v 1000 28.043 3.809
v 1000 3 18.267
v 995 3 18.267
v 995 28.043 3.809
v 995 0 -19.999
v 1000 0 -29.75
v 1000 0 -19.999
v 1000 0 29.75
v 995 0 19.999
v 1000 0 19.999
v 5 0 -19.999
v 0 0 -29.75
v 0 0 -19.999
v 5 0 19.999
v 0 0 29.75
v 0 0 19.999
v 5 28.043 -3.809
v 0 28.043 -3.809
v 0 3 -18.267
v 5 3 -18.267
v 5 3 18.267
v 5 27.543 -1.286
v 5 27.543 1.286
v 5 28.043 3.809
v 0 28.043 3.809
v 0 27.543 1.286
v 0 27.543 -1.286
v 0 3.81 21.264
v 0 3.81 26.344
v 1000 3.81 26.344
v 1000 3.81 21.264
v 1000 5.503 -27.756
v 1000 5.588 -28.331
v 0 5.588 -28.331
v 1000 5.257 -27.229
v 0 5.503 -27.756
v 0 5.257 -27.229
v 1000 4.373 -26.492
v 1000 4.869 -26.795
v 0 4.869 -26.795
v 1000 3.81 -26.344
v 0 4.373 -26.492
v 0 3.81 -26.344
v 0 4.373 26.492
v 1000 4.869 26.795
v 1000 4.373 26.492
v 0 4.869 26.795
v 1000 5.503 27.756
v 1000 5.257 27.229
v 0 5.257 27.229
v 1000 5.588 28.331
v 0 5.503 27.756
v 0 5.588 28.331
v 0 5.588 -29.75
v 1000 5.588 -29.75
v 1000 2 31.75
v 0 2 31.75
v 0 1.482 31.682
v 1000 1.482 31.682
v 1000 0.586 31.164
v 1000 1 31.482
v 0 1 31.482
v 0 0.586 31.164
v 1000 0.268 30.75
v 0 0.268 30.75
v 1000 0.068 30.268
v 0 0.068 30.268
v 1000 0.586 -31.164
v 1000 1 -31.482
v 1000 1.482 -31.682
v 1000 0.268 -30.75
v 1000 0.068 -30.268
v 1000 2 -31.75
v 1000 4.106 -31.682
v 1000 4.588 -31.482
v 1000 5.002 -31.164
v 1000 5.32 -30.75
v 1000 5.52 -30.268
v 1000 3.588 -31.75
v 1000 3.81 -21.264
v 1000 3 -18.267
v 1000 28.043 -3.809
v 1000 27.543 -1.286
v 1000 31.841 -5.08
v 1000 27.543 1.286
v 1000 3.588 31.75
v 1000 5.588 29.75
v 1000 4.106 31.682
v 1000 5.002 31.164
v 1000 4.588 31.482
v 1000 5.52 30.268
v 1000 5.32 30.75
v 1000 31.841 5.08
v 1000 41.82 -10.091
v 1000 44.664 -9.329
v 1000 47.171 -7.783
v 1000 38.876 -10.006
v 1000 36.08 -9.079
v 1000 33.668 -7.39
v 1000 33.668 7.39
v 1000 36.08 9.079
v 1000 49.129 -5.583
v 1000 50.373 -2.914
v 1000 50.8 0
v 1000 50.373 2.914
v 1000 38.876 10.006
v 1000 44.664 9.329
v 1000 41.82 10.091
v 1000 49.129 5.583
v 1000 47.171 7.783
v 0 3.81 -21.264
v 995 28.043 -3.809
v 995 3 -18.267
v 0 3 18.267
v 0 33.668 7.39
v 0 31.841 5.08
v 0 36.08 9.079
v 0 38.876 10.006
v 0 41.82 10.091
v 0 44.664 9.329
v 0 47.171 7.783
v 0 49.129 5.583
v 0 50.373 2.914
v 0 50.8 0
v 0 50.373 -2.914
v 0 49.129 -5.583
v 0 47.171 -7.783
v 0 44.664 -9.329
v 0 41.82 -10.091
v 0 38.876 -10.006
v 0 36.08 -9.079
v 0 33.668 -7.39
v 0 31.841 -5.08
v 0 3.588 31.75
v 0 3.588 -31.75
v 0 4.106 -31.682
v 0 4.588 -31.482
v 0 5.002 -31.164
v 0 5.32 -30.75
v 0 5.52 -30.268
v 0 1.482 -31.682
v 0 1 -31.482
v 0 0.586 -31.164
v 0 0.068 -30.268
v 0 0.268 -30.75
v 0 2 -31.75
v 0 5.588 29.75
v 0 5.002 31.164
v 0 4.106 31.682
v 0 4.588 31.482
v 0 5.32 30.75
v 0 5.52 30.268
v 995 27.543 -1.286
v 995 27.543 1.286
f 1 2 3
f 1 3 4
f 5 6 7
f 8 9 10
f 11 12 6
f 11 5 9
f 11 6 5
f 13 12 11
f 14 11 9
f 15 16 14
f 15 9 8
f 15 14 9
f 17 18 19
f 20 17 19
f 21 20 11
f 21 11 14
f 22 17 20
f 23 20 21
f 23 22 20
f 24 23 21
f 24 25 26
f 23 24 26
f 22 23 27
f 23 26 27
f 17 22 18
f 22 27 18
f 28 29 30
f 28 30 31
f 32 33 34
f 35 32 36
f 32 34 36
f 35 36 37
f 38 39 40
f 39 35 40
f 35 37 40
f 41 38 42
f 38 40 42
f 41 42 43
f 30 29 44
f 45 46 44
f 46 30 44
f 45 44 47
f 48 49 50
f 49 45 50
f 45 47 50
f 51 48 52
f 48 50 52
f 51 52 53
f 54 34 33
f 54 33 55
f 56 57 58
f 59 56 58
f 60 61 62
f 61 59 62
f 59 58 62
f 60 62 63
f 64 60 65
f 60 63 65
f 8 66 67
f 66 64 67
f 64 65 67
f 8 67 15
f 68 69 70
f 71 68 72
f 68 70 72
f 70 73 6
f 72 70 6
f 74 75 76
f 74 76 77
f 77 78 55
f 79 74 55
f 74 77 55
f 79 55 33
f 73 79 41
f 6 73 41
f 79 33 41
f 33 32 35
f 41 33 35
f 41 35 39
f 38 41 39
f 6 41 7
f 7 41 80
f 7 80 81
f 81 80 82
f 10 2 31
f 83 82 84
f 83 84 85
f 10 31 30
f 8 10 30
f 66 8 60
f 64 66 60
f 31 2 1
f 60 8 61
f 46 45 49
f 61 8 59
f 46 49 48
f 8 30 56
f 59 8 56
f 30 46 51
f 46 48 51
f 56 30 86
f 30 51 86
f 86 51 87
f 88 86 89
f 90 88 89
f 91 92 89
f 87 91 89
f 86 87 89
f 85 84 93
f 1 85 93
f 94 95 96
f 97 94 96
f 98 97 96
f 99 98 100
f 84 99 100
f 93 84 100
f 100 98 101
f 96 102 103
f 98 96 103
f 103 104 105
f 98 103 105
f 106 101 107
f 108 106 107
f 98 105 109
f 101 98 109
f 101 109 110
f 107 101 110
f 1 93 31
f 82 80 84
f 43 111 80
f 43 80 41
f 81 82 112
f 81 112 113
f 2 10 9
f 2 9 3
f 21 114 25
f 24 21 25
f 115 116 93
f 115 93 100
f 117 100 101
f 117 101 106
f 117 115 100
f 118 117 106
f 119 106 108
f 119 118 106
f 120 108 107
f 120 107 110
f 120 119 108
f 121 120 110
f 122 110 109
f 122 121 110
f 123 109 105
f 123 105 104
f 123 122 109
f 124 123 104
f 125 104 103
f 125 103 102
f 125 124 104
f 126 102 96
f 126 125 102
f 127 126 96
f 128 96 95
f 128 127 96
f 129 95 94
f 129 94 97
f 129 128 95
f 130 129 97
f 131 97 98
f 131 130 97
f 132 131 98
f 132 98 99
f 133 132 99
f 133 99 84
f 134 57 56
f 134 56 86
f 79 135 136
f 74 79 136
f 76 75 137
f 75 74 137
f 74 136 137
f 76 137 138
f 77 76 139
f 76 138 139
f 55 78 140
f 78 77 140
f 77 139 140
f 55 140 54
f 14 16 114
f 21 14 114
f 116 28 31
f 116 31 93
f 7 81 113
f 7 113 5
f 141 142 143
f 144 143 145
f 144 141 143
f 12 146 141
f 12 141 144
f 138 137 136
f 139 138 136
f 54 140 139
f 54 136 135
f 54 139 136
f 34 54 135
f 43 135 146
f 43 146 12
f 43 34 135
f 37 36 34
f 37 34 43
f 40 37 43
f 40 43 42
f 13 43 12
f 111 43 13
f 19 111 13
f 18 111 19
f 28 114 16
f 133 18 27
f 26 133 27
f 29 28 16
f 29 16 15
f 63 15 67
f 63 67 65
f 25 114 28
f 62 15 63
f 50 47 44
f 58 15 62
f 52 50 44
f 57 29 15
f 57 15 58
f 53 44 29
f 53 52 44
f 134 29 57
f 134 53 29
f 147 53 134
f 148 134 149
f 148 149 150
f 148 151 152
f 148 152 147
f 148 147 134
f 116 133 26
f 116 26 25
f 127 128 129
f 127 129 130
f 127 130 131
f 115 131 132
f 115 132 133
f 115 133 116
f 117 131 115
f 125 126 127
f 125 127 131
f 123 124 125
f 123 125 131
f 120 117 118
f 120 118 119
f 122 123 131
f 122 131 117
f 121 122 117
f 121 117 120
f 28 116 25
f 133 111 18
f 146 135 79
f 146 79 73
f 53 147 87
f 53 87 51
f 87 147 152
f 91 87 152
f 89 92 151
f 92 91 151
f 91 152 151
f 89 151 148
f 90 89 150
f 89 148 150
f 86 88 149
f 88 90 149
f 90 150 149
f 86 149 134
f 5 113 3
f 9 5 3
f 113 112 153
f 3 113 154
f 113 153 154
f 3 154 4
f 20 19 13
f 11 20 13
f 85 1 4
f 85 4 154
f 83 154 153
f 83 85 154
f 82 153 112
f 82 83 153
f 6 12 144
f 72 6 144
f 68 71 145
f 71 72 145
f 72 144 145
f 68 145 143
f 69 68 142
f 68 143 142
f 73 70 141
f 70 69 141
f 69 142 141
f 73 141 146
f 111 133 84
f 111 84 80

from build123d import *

# Parameters (mm, degrees)
BOSS_EXTRUDE1_DEPTH = 1000
CUT_EXTRUDE1_DEPTH  = 5
FILLET1_R           = 2


with BuildPart() as part:
    # Sketch1 → Boss-Extrude1 (new body)
    with BuildSketch(Plane(origin=(0, 0, 0), x_dir=(0, 0, -1), z_dir=(1, 0, 0))):
        with BuildLine():
            Line((-21.263810414, 3.81), (-5.08, 31.841181898))
            ThreePointArc((-5.08, 31.841181898), (0, 50.8), (5.08, 31.841181898))
            Line((5.08, 31.841181898), (21.263810414, 3.81))
            Line((21.263810414, 3.81), (26.343810414, 3.81))
            Line((26.343810414, 3.81), (26.343810414, 5.588))
            Line((26.343810414, 5.588), (31.75, 5.588))
            Line((31.75, 5.588), (31.75, 0))
            Line((31.75, 0), (-31.75, 0))
            Line((-31.75, 0), (-31.75, 5.588))
            Line((-31.75, 5.588), (-26.343810414, 5.588))
            Line((-26.343810414, 5.588), (-26.343810414, 3.81))
            Line((-26.343810414, 3.81), (-21.263810414, 3.81))
        make_face()
    extrude(amount=BOSS_EXTRUDE1_DEPTH)

    # Sketch2 → Cut-Extrude1 (cut)
    with BuildSketch(Plane.ZY):
        with BuildLine():
            Line((19.999413325, 0), (18.267362517, 3))
            Line((18.267362517, 3), (3.808670233, 28.043189647))
            ThreePointArc((3.808670233, 28.043189647), (0, 27.48), (-3.808670233, 28.043189647))
            Line((-3.808670233, 28.043189647), (-18.267362517, 3))
            Line((-18.267362517, 3), (-19.999413325, 0))
            Line((-19.999413325, 0), (19.999413325, 0))
        make_face()
    cut_extrude1 = extrude(amount=-CUT_EXTRUDE1_DEPTH, mode=Mode.SUBTRACT)

    # Mirror1: Cut-Extrude1 across plane
    add(cut_extrude1.mirror(Plane.ZY.offset(-500)), mode=Mode.SUBTRACT)

    # Fillet1
    # the kernel refuses this fillet: 2 mm, written as the material it takes off along each edge
    with BuildSketch(Plane(origin=(-5, 0, 31.75), x_dir=(0, 1, 0), z_dir=(1, 0, 0)), Plane(origin=(-5, 5.588, 31.75), x_dir=(0, 0, -1), z_dir=(1, 0, 0)), Plane(origin=(-5, 0, -31.75), x_dir=(0, 0, 1), z_dir=(1, 0, 0)), Plane(origin=(-5, 5.588, -31.75), x_dir=(0, -1, 0), z_dir=(1, 0, 0))) as fillet1_piece_1:
        with BuildLine():
            CenterArc((FILLET1_R, -FILLET1_R), FILLET1_R, 90, 90)
            Line((0, -FILLET1_R), (-FILLET1_R * 0.02, -FILLET1_R))
            Line((-FILLET1_R * 0.02, -FILLET1_R), (-FILLET1_R * 0.02, FILLET1_R * 0.02))
            Line((-FILLET1_R * 0.02, FILLET1_R * 0.02), (FILLET1_R, FILLET1_R * 0.02))
            Line((FILLET1_R, FILLET1_R * 0.02), (FILLET1_R, 0))
        make_face()
    extrude(amount=1010, mode=Mode.SUBTRACT)
    with BuildSketch(Plane(origin=(-4.969102032, 5.588, 26.343810414), x_dir=(0, -1, 0), z_dir=(1, 0, 0))) as fillet1_piece_2:
        with BuildLine():
            CenterArc((2, -1.987640813), FILLET1_R, 96.372964386, 83.627035614)
            Line((0, -1.987640813), (-0.04, -1.987640813))
            Line((-0.04, -1.987640813), (-0.04, 0))
            Line((-0.04, 0), (0, 0.04))
            ThreePointArc((0, 0.04), (0.889, 0.04), (1.77356, 0.039752816))
            Line((1.77356, 0.039752816), (1.778, 0))
        make_face()
    extrude(amount=1009.938204063, mode=Mode.SUBTRACT)
    with BuildSketch(Plane(origin=(-4.969102032, 5.588, -26.343810414), x_dir=(0, 0, -1), z_dir=(1, 0, 0))) as fillet1_piece_3:
        with BuildLine():
            CenterArc((1.987640813, -2), FILLET1_R, 90, 83.627035614)
            Line((0, -1.778), (-0.039752816, -1.77356))
            ThreePointArc((-0.039752816, -1.77356), (-0.04, -0.889), (-0.04, 0))
            Line((-0.04, 0), (0, 0.04))
            Line((0, 0.04), (1.987640813, 0.04))
            Line((1.987640813, 0.04), (1.987640813, 0))
        make_face()
    extrude(amount=1009.938204063, mode=Mode.SUBTRACT)


solid = part.part
